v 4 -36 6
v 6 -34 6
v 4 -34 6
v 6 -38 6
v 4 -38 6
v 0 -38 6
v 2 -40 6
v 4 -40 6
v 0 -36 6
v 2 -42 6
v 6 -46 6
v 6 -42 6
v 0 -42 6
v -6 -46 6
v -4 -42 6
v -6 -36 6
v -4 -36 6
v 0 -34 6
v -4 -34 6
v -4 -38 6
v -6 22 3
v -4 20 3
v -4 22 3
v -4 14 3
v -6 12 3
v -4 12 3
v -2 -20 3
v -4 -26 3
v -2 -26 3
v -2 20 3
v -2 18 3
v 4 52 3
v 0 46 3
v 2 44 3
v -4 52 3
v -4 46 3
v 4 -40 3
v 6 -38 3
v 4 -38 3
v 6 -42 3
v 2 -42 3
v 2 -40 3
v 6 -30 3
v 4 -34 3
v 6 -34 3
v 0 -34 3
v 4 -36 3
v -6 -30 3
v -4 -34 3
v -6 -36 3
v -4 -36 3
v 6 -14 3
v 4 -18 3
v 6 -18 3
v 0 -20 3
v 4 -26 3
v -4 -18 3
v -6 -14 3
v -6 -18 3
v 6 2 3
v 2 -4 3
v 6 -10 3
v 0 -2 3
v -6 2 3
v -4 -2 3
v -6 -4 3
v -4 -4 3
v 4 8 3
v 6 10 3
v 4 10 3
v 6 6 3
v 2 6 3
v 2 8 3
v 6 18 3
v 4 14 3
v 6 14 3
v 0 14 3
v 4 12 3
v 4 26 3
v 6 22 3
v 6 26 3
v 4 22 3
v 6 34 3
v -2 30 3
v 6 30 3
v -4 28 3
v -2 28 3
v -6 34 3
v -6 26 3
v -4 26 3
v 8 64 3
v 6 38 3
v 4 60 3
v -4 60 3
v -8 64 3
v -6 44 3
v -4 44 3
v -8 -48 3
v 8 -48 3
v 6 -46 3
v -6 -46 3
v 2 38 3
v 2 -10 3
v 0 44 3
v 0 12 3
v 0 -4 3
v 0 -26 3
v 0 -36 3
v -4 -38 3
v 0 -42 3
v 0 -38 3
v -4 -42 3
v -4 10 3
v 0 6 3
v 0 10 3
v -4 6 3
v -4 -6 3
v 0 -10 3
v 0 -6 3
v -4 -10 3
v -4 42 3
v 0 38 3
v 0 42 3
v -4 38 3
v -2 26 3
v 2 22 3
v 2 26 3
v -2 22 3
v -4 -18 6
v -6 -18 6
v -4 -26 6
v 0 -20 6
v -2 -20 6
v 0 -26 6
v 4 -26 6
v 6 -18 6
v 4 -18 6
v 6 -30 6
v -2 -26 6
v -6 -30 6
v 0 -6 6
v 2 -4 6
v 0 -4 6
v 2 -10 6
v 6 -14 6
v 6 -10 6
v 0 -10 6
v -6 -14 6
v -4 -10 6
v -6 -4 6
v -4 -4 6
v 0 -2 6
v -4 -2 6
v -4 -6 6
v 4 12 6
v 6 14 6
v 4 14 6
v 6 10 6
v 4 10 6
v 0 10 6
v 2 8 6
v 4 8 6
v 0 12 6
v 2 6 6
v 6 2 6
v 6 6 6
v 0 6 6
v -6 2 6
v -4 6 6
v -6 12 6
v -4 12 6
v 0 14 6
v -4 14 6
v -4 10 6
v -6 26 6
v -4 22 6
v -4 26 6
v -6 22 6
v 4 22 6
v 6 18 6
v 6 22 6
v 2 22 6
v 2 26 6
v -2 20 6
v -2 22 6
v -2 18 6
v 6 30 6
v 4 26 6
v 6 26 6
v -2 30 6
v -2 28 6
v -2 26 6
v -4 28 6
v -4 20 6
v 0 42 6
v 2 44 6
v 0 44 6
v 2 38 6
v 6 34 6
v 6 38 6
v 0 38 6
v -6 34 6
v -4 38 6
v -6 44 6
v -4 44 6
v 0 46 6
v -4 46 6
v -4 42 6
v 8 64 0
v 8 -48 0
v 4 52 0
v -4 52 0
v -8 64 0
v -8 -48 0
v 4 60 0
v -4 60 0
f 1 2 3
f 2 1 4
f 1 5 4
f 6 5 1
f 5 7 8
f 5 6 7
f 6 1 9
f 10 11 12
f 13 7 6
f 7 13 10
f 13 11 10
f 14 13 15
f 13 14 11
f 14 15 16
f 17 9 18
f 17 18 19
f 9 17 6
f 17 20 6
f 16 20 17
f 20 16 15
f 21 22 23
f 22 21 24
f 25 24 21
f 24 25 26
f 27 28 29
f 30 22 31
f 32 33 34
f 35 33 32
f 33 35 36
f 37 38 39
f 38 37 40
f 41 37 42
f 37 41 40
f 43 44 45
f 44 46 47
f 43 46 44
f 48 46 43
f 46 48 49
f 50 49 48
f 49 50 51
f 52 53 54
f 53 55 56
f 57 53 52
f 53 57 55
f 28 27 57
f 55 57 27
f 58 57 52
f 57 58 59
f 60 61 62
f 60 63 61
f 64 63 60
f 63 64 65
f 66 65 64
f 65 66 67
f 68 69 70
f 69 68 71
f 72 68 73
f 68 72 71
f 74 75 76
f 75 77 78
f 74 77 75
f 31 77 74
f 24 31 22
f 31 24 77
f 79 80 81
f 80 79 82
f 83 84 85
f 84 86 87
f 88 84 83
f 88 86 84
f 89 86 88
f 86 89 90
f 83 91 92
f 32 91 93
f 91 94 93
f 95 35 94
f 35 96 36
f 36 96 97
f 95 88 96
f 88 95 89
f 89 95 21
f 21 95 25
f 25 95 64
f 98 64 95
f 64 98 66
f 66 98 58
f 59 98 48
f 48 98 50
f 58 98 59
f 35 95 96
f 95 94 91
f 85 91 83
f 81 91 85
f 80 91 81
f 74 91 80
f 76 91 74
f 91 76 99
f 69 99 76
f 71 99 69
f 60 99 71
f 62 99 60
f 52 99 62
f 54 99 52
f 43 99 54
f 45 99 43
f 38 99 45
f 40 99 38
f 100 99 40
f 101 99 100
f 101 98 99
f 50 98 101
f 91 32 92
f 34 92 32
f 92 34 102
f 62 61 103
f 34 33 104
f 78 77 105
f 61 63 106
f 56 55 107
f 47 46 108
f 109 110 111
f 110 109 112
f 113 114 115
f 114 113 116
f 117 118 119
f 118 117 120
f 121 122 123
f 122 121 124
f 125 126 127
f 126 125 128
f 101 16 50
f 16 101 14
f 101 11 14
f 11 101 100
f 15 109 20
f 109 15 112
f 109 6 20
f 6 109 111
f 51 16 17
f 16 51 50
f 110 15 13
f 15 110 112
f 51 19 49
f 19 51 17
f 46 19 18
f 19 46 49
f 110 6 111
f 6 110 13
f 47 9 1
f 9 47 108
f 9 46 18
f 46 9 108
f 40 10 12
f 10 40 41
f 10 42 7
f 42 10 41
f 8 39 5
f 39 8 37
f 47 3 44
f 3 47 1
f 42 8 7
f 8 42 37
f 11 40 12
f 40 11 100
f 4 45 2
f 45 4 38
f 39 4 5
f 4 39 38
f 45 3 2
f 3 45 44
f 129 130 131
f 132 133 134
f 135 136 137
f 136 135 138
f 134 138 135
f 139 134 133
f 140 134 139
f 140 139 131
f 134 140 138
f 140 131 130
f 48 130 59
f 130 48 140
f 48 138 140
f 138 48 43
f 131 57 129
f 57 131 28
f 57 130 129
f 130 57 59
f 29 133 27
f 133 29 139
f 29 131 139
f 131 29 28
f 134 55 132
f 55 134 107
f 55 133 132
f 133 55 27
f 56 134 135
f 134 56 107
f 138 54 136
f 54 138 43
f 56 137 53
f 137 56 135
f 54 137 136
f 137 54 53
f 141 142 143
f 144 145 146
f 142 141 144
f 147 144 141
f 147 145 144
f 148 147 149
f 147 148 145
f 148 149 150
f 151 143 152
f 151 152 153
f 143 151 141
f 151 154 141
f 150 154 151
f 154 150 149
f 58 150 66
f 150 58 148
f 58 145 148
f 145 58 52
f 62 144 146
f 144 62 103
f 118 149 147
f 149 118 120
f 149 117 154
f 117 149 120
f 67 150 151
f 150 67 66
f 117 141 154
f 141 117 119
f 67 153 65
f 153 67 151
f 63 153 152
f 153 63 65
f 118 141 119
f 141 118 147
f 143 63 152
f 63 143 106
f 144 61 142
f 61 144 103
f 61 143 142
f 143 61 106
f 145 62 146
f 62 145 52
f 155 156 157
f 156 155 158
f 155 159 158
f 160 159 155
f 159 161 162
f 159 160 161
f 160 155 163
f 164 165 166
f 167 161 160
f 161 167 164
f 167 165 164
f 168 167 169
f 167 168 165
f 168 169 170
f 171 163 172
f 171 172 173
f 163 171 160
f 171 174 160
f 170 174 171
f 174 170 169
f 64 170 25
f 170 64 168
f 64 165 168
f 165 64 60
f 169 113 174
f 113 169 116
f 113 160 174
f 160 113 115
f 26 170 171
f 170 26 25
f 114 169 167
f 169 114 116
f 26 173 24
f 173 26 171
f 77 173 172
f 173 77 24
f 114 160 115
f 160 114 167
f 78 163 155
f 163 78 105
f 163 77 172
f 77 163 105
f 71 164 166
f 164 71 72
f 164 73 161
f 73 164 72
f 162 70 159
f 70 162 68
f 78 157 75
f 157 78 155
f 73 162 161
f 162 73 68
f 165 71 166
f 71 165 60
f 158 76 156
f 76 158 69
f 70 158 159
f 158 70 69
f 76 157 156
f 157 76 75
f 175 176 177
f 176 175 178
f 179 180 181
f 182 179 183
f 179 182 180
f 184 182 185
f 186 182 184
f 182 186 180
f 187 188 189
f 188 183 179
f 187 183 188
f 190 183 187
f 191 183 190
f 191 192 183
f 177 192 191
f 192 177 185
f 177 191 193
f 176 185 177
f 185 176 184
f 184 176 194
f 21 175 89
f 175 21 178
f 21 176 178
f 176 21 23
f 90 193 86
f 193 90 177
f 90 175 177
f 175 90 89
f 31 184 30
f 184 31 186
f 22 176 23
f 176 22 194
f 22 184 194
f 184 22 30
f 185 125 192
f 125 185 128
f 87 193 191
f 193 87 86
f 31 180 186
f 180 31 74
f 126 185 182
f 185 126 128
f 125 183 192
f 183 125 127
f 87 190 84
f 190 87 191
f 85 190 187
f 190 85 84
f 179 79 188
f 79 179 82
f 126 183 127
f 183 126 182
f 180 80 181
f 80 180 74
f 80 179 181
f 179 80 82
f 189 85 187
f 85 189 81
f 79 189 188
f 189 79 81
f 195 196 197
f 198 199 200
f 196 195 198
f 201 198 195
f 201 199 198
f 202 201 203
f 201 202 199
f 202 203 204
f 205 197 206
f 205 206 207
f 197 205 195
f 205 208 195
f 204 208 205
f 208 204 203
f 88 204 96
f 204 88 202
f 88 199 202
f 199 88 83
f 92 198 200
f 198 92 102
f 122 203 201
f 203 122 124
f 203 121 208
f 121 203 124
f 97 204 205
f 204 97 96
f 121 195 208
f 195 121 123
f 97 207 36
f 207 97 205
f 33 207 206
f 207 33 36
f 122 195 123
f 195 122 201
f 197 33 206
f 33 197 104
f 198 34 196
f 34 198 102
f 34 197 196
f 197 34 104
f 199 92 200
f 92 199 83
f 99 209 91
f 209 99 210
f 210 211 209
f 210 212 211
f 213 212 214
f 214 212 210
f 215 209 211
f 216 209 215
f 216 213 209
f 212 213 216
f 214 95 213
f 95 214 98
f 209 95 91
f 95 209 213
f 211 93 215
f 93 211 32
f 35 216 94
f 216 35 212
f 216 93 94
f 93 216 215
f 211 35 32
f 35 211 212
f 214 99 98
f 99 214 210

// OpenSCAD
/*
Parametric Name Tag 
Tony Buser <tbuser@gmail.com>
http://tonybuser.com
http://creativecommons.org/licenses/by/3.0/
*/

use <bitmap.scad>

// change chars array and char_count
// OpenSCAD has no string or length methods :(
chars = ["R", "E", "P", "R", "A", "P"];
char_count = 6;


// block size 1 will result in 8mm per letter
block_size = 2;
// height is the Z height of each letter
height = 3;
// Append a hole fo a keyring, necklace etc. ?
key_ring_hole = true;

union() {
	translate(v = [0,-block_size*8*char_count/2+block_size*8/2,3]) {
		8bit_str(chars, char_count, block_size, height);
	}
	translate(v = [0,0,3/2]) {
		color([0,0,1,1]) {
			cube(size = [block_size * 8, block_size * 8 * char_count, 3], center = true);
		}
	}
	if (key_ring_hole == true){
		translate([0, block_size * 8 * (char_count+1)/2, 3/2])	
		difference(){
			cube(size = [block_size * 8, block_size * 8 , 3], center = true);
			cube(size = [block_size * 4, block_size * 4 , 5], center = true);
		}
	}
}
